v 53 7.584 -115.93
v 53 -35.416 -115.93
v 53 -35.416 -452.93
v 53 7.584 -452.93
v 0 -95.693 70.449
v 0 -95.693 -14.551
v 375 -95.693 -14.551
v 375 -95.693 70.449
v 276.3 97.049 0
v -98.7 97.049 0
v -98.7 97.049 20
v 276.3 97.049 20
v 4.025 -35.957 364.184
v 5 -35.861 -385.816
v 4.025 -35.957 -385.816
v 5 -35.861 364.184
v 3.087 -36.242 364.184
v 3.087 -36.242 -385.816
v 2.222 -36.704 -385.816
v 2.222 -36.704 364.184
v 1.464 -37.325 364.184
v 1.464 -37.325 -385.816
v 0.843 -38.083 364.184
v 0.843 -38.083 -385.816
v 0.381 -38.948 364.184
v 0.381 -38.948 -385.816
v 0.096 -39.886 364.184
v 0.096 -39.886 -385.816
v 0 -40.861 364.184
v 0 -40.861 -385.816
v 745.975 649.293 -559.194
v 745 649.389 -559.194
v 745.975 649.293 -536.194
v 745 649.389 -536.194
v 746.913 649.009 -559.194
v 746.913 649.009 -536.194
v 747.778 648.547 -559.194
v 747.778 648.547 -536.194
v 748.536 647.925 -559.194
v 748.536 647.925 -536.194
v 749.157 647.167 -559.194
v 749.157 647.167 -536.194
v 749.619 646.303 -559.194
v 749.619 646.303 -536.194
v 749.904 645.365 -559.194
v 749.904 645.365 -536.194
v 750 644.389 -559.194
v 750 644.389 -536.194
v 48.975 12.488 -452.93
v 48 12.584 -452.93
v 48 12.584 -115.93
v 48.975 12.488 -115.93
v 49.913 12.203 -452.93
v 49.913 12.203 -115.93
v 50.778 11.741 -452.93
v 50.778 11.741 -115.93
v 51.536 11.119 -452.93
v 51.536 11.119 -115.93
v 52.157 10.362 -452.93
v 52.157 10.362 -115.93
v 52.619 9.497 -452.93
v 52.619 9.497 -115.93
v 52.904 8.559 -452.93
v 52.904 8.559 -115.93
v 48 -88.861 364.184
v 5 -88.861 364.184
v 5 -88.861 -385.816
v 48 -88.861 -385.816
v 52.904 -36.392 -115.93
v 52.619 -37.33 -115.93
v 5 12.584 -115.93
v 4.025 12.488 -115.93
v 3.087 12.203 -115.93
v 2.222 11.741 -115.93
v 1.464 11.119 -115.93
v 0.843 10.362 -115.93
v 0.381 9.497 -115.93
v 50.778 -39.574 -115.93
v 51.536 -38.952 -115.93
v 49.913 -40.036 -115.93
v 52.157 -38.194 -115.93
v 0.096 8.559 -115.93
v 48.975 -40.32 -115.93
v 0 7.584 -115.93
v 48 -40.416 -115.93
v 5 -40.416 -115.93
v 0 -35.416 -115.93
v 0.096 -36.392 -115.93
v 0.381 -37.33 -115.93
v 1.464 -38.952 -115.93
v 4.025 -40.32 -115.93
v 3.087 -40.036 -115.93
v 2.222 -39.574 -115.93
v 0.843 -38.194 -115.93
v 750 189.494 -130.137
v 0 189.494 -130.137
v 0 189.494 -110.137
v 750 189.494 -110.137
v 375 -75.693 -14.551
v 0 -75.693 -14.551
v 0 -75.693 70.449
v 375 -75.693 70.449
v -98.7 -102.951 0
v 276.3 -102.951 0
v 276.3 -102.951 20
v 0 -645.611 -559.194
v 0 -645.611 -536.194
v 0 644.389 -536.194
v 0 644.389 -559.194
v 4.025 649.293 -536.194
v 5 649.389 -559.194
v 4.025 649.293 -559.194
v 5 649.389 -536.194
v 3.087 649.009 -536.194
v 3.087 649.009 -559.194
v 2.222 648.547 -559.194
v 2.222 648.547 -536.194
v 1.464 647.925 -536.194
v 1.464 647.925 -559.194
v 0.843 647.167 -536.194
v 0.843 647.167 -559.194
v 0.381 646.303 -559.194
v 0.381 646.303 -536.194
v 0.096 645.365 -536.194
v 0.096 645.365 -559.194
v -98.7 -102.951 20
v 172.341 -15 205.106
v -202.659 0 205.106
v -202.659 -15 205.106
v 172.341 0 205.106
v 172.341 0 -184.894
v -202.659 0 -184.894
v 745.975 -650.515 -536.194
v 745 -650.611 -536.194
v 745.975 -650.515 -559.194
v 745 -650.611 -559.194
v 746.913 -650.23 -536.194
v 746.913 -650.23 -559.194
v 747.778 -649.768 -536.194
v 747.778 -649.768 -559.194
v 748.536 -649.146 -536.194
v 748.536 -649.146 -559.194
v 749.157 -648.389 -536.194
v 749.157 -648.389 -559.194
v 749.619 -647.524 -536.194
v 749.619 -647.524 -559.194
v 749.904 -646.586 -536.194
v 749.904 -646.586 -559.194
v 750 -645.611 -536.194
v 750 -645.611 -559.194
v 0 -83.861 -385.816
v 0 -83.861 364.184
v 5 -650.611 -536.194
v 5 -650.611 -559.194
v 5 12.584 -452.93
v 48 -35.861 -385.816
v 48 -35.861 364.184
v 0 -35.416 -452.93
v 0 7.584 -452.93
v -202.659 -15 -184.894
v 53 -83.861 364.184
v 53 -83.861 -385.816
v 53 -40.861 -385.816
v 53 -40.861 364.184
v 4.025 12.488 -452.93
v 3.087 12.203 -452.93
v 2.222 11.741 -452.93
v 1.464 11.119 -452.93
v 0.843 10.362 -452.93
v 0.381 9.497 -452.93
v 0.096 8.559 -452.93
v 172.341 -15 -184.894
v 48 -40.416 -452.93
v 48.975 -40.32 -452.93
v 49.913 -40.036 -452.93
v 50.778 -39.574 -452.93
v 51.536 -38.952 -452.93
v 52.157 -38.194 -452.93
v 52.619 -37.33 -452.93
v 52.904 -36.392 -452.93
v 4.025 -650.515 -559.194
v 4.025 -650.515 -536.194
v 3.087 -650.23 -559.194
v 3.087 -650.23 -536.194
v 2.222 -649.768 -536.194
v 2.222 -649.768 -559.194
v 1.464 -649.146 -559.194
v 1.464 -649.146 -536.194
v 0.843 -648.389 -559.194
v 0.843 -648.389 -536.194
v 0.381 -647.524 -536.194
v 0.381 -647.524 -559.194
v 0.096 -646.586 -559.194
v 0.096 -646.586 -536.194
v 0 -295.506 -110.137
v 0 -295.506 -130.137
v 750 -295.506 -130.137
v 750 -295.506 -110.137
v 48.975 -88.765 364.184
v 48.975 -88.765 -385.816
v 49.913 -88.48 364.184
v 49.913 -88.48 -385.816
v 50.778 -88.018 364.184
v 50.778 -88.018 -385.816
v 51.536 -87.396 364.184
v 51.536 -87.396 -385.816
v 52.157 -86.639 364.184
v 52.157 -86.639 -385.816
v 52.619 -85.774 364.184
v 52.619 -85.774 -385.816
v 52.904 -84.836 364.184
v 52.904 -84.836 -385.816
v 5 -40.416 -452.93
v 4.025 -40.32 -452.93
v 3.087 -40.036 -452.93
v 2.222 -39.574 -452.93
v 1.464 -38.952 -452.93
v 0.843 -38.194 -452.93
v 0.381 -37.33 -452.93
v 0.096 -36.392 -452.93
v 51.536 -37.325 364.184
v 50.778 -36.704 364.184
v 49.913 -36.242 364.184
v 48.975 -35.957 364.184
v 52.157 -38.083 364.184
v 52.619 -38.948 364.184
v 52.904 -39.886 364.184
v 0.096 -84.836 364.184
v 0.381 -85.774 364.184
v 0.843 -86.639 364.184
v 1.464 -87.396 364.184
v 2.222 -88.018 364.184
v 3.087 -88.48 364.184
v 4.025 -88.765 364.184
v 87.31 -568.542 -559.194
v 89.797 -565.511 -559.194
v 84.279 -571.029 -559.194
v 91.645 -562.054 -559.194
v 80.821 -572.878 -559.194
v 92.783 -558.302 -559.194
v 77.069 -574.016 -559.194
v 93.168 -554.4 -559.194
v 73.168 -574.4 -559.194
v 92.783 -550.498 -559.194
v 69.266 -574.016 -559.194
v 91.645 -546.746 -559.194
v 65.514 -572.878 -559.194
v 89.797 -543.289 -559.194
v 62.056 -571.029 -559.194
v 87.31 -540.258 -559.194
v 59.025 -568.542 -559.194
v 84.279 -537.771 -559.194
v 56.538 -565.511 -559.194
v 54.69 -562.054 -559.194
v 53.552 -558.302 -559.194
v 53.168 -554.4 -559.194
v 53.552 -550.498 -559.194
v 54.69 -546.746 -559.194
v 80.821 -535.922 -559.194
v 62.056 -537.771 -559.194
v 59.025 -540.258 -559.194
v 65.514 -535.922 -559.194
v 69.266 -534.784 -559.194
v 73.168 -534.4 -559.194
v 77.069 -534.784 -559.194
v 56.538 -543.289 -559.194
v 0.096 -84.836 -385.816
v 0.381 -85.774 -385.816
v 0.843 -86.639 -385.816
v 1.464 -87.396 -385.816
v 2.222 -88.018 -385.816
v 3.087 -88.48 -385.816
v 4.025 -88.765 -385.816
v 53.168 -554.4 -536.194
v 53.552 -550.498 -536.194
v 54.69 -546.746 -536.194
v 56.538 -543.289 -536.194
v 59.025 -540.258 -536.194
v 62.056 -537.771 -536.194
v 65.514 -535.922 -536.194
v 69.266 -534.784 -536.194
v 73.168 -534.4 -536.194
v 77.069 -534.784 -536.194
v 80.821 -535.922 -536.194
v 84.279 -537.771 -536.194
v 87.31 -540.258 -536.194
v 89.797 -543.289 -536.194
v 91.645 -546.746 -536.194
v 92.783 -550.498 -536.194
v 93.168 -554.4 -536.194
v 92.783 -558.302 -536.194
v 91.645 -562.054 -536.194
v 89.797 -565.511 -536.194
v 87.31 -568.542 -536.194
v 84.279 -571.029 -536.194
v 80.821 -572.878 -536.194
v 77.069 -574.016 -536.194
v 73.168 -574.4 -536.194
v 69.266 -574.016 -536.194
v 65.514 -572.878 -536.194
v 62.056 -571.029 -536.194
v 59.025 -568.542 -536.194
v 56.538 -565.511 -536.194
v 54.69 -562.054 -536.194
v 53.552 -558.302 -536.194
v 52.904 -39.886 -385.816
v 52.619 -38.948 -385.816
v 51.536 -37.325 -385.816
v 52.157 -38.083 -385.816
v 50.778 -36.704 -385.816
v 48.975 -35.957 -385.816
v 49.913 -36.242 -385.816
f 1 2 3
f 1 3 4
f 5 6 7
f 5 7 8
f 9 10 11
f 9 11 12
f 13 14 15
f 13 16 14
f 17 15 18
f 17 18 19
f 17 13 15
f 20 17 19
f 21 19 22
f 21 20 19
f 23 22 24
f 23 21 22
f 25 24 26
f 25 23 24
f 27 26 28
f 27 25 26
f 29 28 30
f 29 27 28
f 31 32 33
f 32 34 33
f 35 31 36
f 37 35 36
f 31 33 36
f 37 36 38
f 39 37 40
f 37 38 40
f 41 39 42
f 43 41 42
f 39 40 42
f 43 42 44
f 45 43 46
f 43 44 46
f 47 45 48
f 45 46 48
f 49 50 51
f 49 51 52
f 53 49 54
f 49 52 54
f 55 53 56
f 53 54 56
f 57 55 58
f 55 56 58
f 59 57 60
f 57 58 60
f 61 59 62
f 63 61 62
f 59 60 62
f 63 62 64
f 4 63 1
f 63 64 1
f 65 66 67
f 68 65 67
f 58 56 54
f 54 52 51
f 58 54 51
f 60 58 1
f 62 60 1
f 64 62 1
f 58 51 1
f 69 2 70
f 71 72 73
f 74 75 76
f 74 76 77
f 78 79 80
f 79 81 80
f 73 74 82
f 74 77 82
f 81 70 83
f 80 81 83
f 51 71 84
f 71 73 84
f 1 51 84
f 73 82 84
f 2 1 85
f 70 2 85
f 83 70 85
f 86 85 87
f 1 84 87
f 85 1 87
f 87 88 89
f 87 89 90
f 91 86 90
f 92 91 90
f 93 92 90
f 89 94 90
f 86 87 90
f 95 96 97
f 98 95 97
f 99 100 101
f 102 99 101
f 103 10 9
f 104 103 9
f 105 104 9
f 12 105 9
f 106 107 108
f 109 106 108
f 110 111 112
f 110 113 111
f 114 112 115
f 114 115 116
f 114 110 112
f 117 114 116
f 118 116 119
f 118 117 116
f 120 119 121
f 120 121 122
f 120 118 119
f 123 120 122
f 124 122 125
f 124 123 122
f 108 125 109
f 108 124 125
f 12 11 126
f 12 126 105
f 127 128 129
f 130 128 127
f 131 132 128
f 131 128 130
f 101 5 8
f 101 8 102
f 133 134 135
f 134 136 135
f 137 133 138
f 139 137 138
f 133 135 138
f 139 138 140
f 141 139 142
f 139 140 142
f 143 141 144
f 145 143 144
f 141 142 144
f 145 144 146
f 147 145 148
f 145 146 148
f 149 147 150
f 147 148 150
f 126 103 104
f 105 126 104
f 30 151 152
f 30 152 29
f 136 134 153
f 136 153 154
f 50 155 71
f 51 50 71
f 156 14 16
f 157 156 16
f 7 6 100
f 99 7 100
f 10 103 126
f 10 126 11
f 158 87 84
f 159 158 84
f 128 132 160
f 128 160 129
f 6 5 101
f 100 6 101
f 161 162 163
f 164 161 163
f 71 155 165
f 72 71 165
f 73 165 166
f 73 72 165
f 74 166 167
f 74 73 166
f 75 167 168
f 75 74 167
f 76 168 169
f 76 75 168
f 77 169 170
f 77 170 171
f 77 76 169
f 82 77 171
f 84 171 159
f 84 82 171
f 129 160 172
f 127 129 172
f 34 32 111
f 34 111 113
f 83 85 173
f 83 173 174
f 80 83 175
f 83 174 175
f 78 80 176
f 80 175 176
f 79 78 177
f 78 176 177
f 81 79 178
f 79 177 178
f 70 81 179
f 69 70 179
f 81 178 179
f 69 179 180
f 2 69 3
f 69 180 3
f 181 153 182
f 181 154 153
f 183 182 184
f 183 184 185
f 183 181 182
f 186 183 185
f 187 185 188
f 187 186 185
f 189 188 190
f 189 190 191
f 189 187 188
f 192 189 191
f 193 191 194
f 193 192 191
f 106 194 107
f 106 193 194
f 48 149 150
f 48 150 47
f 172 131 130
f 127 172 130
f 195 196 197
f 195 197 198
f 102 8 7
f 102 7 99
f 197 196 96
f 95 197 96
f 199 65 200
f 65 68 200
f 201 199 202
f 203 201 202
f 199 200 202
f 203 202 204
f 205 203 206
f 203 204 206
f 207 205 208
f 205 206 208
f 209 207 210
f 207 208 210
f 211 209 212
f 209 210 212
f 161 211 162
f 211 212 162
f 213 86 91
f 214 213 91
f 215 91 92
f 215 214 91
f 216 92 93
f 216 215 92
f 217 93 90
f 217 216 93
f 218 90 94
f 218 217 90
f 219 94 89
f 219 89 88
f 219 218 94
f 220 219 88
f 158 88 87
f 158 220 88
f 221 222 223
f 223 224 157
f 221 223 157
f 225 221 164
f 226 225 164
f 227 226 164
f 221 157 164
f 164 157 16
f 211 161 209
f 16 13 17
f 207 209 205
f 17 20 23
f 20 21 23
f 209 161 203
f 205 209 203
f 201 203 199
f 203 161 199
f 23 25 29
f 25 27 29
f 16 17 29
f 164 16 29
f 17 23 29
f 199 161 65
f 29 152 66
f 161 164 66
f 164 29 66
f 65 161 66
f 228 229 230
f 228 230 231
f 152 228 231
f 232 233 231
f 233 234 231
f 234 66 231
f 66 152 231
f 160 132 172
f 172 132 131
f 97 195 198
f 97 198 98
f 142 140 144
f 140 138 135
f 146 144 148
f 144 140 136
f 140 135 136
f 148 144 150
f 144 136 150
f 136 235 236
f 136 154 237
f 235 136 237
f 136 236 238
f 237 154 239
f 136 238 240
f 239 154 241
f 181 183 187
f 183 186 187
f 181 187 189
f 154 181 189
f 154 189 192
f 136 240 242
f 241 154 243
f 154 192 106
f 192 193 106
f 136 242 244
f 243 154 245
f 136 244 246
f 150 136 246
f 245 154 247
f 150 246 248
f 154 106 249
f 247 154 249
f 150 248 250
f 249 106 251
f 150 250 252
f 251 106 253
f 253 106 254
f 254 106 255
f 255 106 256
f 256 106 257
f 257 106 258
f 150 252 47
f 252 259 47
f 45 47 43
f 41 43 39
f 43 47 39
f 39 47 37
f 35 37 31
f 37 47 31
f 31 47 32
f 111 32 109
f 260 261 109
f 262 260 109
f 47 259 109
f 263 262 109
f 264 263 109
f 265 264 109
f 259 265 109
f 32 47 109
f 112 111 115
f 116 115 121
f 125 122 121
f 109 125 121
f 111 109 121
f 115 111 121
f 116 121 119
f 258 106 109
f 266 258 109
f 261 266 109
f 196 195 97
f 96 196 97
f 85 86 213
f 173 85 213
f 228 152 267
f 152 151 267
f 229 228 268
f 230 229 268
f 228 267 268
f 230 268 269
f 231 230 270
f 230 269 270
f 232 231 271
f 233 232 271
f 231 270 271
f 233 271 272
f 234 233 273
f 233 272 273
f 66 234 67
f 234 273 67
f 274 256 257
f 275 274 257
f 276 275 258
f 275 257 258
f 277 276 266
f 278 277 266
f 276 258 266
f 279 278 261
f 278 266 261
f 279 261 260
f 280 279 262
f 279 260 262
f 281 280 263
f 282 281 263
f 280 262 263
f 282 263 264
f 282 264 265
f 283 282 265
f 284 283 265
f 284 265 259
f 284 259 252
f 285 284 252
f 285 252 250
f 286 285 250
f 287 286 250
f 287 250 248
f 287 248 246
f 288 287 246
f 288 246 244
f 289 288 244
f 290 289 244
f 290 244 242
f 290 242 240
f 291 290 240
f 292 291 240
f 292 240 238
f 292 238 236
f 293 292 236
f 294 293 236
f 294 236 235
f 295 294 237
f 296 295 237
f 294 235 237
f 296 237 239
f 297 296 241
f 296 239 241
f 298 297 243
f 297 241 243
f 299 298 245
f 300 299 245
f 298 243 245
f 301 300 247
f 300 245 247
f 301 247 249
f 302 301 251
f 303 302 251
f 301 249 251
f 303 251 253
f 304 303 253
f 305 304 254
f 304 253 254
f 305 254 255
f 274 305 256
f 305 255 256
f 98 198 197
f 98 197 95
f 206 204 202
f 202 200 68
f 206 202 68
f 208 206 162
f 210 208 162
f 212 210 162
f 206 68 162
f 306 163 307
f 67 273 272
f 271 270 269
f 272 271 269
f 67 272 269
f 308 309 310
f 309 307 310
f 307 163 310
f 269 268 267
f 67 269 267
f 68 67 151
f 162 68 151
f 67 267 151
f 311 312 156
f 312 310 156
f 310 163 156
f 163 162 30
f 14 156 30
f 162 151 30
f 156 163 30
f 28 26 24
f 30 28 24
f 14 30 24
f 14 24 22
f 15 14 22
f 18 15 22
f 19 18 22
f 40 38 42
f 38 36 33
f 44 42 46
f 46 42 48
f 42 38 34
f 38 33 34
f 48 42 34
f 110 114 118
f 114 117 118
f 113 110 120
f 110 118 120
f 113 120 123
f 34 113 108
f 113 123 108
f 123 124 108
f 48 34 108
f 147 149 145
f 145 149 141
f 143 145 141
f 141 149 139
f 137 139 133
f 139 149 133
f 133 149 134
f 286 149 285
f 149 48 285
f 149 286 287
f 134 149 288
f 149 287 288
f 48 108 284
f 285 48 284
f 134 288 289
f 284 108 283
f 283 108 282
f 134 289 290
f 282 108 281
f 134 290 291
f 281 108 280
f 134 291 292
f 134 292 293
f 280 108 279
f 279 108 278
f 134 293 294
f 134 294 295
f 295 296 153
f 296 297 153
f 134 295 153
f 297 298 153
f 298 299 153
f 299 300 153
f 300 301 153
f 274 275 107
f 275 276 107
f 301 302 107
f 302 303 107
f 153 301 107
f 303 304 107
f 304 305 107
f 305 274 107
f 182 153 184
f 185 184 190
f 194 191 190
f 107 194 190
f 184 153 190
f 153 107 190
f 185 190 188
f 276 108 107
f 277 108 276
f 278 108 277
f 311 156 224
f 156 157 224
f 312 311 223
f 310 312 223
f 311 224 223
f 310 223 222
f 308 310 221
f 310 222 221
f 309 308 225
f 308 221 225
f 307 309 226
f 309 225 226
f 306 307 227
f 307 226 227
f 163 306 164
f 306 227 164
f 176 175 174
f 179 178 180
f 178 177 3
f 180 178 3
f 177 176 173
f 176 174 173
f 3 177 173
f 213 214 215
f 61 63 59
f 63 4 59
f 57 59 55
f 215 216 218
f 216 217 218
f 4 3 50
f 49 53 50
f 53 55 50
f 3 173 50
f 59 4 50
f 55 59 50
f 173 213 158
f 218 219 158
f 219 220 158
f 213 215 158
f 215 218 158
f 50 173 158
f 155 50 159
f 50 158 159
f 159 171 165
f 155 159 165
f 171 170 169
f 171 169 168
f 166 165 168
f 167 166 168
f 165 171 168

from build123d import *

# Parameters (mm, degrees)
F1_DEPTH        = 750
F3_DEPTH        = 53
F5_DEPTH        = 53
F6_R            = 5
F6_2_R          = 5
F6_3_R          = 5
F7_R            = 5
F9_W            = 375
F9_H            = 390
F10_DEPTH       = 15
F11_W           = 375
F11_H           = 200
F12_DEPTH       = 20
F13_W           = 485
F13_H           = 20
F14_DEPTH       = 750
F16_D           = 40
F16_DEPTH       = 40
F16_CBORE_D     = 40
F16_CBORE_DEPTH = 5
F16_TIP         = 12.0172123806
F17_W           = 20
F17_H           = 85
F18_DEPTH       = 375


# Not quite as in the source:
# - two fillets or chamfers of one size are made in one step


with BuildPart() as f1:
    # F0 (on Right) → F1 (new body)
    with BuildSketch(Plane.YZ):
        Polygon((649.3892060593, -536.194252491), (-650.6107939407, -536.194252491), (-650.6107939407, -559.194252491), (-635.6107939407, -559.194252491), (-435.6107939407, -559.194252491), (-420.6107939407, -559.194252491), (-417.3657000065, -559.194252491), (-399.3657000065, -559.194252491), (549.3892060593, -559.194252491), (569.3892060593, -559.194252491), (649.3892060593, -559.194252491), align=None)
    extrude(amount=F1_DEPTH)

    # F6
    f6_edges = [f1.edges().sort_by_distance(p)[0] for p in [
        (750, -650.610794, -547.694252),
        (750, 649.389206, -547.694252),
        (0, 649.389206, -547.694252),
        (0, -650.610794, -547.694252),
    ]]
    fillet(f6_edges, radius=F6_R)

    # F16
    with Locations(Plane.XY.offset(-536.194252491)):
        with Locations((73.1676146388, -554.3999671936)):
            CounterBoreHole(F16_D / 2, F16_CBORE_D / 2, F16_CBORE_DEPTH, depth=F16_DEPTH)
            with Locations((0, 0, -(F16_DEPTH + F16_TIP / 2))):  # 118° drill point
                Cone(0, F16_D / 2, F16_TIP, mode=Mode.SUBTRACT)


with BuildPart() as f3:
    # F2 (on Right) → F3 (new body)
    with BuildSketch(Plane.YZ):
        Polygon((-35.8609634377, 364.1842640936), (-88.8609634377, 364.1842640936), (-88.8609634377, 341.5341340936), (-88.8609634377, 142.1397668123), (-88.8609634377, 122.1397668123), (-88.8609634377, 4.1842640936), (-88.8609634377, -10.8157359064), (-88.8609634377, -385.8157359064), (-35.8609634377, -385.8157359064), align=None)
    extrude(amount=F3_DEPTH)

    # F6#2
    f6_2_edges = [f3.edges().sort_by_distance(p)[0] for p in [
        (53, -88.860963, -10.815736),
        (53, -35.860963, -10.815736),
        (0, -35.860963, -10.815736),
    ]]
    fillet(f6_2_edges, radius=F6_2_R)

    # F7
    f7_edges = [f3.edges().sort_by_distance(p)[0] for p in [
        (0, -88.860963, -10.815736),
    ]]
    fillet(f7_edges, radius=F7_R)


with BuildPart() as f5:
    # F4 (on Right) → F5 (new body)
    with BuildSketch(Plane.YZ):
        Polygon((12.5836707864, -115.9304558238), (-40.4163292136, -115.9304558238), (-40.4163292136, -138.5805858238), (-40.4163292136, -269.4304558238), (-40.4163292136, -284.4304558238), (-40.4163292136, -452.9304558238), (12.5836707864, -452.9304558238), align=None)
    extrude(amount=F5_DEPTH)

    # F6#3
    f6_3_edges = [f5.edges().sort_by_distance(p)[0] for p in [
        (0, 12.583671, -284.430456),
        (53, 12.583671, -284.430456),
        (53, -40.416329, -284.430456),
        (0, -40.416329, -284.430456),
    ]]
    fillet(f6_3_edges, radius=F6_3_R)


with BuildPart() as f10:
    # F9 (on Front) → F10 (new body)
    with BuildSketch(Plane.XZ):
        with Locations((-15.1590108871, 10.105997324)):
            Rectangle(F9_W, F9_H)
    extrude(amount=F10_DEPTH)


with BuildPart() as f12:
    # F11 (on Top) → F12 (new body)
    with BuildSketch(Plane.XY):
        with Locations((88.7996369725, -2.9512345791)):
            Rectangle(F11_W, F11_H)
    extrude(amount=F12_DEPTH)


with BuildPart() as f14:
    # F13 (on Right) → F14 (new body)
    with BuildSketch(Plane.YZ):
        with Locations((-53.0060548335, -120.13693689)):
            Rectangle(F13_W, F13_H)
    extrude(amount=F14_DEPTH)


with BuildPart() as f18:
    # F17 (on Right) → F18 (new body)
    with BuildSketch(Plane.YZ):
        with Locations((-85.6926859457, 27.9485643841)):
            Rectangle(F17_W, F17_H)
    extrude(amount=F18_DEPTH)


solid = Compound([f1.part, f3.part, f5.part, f10.part, f12.part, f14.part, f18.part])
